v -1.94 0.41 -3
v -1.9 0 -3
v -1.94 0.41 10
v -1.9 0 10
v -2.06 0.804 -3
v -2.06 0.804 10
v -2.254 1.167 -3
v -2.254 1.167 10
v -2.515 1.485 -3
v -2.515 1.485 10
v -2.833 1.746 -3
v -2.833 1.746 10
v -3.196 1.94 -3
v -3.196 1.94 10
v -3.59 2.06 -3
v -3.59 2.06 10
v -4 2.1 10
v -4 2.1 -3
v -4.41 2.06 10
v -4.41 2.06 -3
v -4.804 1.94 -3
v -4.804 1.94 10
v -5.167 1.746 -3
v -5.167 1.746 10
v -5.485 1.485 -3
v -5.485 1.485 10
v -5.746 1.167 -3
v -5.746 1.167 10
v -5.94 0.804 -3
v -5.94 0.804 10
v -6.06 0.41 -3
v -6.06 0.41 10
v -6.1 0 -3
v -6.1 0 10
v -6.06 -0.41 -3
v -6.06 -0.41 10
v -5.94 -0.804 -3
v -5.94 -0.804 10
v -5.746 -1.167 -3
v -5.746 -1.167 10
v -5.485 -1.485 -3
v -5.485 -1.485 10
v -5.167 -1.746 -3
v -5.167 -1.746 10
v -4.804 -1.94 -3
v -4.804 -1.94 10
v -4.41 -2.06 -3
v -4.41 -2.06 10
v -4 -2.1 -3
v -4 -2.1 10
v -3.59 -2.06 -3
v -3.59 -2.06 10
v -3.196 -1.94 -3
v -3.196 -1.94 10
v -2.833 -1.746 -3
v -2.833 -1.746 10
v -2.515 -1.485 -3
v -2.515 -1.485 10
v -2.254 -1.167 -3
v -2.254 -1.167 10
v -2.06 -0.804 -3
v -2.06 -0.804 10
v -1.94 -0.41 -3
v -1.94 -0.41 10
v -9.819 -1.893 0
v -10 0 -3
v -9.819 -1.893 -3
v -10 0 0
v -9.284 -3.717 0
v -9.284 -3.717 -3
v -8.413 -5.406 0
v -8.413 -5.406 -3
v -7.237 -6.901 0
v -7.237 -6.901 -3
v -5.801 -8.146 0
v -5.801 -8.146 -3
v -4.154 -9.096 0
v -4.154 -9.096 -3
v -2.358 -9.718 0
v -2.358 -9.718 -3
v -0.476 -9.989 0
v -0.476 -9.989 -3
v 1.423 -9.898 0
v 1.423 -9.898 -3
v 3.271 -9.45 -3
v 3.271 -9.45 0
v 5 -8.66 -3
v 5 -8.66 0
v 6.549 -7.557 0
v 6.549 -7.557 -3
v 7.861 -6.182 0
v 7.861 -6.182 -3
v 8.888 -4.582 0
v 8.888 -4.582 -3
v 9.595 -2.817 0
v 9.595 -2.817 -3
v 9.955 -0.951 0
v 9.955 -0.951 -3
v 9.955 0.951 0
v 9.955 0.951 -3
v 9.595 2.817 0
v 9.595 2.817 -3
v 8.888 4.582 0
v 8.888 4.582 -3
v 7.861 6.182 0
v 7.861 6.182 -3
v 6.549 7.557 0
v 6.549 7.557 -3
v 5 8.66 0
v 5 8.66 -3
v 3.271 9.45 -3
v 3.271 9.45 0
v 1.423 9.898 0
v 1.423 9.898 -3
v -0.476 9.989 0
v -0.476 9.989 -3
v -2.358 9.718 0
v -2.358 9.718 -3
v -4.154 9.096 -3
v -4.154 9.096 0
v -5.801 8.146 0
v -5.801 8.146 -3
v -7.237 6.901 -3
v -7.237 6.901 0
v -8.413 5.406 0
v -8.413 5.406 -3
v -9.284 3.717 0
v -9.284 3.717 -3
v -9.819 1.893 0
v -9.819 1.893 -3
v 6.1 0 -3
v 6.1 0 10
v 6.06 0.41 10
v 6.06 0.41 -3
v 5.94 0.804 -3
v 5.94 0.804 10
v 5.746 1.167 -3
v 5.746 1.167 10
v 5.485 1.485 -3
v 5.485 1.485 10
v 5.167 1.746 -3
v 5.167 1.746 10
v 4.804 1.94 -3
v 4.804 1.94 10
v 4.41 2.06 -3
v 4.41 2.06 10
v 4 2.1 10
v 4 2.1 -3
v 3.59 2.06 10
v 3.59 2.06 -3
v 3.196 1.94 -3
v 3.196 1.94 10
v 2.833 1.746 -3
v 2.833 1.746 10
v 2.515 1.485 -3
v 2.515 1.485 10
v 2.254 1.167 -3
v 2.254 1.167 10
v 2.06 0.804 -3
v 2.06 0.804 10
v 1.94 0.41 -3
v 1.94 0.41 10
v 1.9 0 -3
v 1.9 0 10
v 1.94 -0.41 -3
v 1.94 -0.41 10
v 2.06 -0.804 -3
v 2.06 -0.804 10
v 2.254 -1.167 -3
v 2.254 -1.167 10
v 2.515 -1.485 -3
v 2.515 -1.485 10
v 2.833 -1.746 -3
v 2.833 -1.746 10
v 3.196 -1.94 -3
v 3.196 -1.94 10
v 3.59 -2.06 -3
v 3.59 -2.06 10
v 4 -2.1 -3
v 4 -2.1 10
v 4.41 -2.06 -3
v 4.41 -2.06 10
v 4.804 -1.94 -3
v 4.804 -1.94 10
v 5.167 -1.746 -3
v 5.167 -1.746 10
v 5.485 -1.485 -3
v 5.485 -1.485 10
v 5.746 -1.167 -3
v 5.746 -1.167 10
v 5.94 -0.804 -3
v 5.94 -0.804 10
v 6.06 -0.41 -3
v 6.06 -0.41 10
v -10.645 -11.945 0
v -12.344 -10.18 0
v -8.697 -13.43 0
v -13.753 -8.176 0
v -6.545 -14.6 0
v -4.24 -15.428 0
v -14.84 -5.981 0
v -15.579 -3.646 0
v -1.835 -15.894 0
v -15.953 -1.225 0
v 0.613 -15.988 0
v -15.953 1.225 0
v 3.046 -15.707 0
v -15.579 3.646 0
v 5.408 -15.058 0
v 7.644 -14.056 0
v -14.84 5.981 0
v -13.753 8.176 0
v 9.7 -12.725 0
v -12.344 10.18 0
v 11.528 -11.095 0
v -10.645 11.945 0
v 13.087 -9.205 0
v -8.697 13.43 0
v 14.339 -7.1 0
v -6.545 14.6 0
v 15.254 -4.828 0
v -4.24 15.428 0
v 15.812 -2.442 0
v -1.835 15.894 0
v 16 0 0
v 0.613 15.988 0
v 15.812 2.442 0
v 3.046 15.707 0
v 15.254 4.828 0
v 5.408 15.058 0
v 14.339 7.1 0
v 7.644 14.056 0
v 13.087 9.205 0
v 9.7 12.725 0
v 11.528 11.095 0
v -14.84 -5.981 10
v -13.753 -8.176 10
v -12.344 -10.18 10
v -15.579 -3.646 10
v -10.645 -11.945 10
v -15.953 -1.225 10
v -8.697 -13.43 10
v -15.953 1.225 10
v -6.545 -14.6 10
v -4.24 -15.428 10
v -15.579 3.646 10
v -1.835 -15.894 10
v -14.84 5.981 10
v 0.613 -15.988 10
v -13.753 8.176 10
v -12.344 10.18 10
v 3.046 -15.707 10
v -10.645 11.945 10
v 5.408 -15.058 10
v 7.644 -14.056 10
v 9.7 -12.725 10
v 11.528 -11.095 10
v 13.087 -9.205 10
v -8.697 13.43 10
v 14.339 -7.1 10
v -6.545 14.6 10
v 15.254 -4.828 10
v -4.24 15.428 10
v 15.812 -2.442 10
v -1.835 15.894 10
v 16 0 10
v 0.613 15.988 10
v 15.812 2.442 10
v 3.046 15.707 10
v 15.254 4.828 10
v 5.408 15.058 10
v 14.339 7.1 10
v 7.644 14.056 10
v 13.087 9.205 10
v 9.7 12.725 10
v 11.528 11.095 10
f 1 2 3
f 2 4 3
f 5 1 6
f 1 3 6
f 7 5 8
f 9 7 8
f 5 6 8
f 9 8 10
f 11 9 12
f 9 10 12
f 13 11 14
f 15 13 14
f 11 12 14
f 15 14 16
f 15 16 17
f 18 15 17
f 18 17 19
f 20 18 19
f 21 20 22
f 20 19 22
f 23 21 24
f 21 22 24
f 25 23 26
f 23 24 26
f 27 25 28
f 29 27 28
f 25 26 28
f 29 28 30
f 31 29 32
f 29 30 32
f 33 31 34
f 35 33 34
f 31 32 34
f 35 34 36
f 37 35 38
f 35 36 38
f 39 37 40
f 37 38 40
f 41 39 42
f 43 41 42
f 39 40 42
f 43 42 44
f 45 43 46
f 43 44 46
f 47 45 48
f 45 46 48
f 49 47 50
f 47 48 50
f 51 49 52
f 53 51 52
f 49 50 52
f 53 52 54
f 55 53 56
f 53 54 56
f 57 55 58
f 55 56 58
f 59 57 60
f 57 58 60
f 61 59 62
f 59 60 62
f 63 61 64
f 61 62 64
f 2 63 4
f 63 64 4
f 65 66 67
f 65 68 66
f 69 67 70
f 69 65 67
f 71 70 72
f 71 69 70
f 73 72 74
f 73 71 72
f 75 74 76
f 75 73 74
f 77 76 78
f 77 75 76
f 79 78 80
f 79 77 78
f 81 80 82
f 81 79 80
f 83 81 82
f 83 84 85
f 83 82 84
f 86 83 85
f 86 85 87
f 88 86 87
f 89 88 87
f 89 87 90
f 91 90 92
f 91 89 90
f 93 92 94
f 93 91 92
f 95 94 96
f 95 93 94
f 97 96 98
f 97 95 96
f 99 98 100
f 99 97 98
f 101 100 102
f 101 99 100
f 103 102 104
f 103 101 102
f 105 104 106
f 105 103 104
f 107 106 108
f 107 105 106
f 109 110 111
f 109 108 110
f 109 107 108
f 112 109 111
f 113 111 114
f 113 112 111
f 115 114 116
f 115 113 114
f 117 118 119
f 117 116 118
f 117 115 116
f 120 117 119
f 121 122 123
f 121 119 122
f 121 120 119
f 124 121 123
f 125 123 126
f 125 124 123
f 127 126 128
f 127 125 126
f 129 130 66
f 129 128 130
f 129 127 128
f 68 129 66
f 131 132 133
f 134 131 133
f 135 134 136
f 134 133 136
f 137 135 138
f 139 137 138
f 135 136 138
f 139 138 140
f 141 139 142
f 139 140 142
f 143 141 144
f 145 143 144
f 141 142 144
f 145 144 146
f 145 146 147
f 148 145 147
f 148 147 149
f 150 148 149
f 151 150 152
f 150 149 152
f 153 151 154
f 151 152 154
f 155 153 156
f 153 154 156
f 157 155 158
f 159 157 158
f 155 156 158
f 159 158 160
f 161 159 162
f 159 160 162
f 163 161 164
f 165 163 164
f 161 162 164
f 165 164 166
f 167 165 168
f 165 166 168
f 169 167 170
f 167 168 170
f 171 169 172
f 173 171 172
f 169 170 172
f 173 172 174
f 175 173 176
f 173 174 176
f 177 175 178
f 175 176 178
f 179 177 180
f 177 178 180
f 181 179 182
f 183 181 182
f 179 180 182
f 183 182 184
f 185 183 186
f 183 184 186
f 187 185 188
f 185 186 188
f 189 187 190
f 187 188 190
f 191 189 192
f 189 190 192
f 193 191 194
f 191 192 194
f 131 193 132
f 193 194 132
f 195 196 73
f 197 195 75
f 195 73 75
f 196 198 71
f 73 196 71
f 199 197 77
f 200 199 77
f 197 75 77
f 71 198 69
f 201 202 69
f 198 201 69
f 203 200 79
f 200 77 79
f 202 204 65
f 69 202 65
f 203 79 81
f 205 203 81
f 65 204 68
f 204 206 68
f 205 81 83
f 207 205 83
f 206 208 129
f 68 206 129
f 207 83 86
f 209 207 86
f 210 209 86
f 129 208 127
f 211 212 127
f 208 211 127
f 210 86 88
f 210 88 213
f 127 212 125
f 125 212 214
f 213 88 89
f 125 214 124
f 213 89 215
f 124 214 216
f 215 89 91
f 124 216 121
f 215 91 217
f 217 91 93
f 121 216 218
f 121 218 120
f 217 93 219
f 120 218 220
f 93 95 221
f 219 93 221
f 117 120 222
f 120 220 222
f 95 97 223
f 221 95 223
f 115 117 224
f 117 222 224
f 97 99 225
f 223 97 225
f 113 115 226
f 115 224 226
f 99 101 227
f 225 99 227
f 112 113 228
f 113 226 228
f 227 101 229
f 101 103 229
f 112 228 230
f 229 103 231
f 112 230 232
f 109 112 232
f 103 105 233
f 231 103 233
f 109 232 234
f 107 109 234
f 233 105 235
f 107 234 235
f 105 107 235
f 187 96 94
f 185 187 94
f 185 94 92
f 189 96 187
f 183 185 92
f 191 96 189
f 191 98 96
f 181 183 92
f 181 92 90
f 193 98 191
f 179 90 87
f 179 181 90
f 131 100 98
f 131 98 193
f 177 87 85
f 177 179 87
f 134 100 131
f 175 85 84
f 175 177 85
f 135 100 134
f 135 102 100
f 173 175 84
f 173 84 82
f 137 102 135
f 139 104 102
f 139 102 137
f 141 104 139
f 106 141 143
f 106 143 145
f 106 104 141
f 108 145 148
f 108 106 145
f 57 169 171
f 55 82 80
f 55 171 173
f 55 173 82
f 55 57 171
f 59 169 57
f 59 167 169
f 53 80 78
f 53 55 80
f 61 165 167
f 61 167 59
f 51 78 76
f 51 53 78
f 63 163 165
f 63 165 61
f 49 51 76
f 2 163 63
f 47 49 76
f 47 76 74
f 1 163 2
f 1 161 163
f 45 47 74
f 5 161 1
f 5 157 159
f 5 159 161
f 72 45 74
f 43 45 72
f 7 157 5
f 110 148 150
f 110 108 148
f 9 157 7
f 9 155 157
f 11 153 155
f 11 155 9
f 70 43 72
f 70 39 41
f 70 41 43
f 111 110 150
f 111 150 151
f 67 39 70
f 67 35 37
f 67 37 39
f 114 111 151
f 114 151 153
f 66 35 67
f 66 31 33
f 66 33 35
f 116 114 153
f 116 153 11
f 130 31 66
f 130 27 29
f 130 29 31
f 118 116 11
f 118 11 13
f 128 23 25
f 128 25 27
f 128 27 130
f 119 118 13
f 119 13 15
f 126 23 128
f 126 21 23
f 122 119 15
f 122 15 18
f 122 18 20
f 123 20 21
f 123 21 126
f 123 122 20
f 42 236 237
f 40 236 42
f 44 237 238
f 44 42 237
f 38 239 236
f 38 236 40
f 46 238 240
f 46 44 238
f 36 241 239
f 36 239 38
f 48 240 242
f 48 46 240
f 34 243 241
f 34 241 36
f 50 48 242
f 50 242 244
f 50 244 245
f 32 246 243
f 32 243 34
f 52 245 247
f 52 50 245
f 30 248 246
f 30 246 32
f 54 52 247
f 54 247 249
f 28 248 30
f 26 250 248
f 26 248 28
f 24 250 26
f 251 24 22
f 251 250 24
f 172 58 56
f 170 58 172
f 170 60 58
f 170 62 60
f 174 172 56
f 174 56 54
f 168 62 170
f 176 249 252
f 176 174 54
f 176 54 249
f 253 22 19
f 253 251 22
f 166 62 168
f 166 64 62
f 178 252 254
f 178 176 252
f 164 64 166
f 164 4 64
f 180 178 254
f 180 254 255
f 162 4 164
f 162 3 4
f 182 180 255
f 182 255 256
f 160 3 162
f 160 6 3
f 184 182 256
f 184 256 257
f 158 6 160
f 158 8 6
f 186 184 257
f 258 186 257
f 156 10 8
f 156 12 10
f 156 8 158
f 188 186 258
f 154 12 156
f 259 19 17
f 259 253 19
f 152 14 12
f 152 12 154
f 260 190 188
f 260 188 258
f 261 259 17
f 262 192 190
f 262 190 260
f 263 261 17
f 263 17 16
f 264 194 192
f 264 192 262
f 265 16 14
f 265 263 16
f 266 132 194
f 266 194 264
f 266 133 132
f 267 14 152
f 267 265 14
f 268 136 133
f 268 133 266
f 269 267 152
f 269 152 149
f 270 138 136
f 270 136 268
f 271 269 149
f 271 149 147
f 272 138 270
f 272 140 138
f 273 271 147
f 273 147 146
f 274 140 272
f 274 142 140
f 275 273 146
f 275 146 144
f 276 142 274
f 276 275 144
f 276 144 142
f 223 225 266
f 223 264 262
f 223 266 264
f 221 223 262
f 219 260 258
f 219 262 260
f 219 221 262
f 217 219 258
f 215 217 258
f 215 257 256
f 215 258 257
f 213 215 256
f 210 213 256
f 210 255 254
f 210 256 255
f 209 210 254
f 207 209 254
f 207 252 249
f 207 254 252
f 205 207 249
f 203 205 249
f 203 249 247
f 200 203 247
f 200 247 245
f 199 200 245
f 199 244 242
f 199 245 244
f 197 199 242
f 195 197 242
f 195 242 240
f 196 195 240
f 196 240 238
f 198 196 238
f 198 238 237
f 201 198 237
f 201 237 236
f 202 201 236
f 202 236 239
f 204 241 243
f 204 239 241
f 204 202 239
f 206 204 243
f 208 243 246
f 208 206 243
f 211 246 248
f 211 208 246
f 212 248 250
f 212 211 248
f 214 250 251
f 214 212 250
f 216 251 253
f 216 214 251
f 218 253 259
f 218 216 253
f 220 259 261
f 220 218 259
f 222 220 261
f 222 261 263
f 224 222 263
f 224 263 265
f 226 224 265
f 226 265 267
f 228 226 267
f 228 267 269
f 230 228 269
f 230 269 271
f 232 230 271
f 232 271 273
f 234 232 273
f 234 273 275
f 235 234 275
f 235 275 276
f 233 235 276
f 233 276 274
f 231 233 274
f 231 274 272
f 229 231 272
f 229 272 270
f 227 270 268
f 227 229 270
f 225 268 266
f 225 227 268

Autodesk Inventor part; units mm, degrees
ref_plane "YZ Plane" through (0, 0, 0) normal (1, 0, 0) x (0, 1, 0)
ref_plane "XZ Plane" through (0, 0, 0) normal (0, 1, 0) x (-1, 0, 0)
ref_plane "XY Plane" through (0, 0, 0) normal (0, 0, 1) x (1, 0, 0)
sketch "Sketch1" plane through (0, 0, 0) normal (0, 0, 1) x (1, 0, 0)
  circle A0 centre (0, 0) radius 16
  dimension "d0" = 32
extrude "Extrusion1" add sketch "Sketch1" along normal blind 10
sketch "Sketch3" plane through (0, 0, 0) normal (0, 0, -1) x (-1, 0, 0)
  circle A0 centre (0, 0) radius 10
  dimension "d9" = 20
extrude "Extrusion3" add sketch "Sketch3" along normal blind 3
sketch "Sketch2" plane through (0, 0, 10) normal (0, 0, 1) x (1, 0, 0)
  circle A0 centre (-4, 0) radius 2.1
  circle A1 centre (4, 0) radius 2.1
  point P0 (0, 0)
  dimension "d3" = 4
  dimension "d4" = 4
  dimension "d5" = 4.2
  dimension "d6" = 4.2
extrude "Extrusion2" cut sketch "Sketch2" against normal through all
properties part number "Remskive to huller"
